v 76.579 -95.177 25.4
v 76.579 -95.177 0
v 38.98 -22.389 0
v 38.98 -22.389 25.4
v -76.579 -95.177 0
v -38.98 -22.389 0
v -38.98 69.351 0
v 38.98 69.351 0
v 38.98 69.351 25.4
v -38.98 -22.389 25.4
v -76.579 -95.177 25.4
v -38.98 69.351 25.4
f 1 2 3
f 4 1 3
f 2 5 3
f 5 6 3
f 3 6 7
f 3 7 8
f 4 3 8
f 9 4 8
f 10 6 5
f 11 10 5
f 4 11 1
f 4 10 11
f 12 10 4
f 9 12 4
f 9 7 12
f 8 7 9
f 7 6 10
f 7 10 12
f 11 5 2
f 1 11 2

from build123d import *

# Parameters (mm, degrees)
F0_W     = 77.960826
F0_H     = 91.74003
F1_DEPTH = 25.4
F2_DEPTH = 25.4


with BuildPart() as f1:
    # F0 (on Top) → F1 (new body)
    with BuildSketch(Plane.XY):
        with Locations((0, 23.481315)):
            Rectangle(F0_W, F0_H)
    extrude(amount=F1_DEPTH)

    # F0 (on Top) → F2 (join)
    with BuildSketch(Plane.XY):
        Polygon((-76.578632, -95.176995), (76.578632, -95.176995), (38.980413, -22.3887), (-38.980413, -22.3887), align=None)
    extrude(amount=F2_DEPTH)


solid = f1.part
